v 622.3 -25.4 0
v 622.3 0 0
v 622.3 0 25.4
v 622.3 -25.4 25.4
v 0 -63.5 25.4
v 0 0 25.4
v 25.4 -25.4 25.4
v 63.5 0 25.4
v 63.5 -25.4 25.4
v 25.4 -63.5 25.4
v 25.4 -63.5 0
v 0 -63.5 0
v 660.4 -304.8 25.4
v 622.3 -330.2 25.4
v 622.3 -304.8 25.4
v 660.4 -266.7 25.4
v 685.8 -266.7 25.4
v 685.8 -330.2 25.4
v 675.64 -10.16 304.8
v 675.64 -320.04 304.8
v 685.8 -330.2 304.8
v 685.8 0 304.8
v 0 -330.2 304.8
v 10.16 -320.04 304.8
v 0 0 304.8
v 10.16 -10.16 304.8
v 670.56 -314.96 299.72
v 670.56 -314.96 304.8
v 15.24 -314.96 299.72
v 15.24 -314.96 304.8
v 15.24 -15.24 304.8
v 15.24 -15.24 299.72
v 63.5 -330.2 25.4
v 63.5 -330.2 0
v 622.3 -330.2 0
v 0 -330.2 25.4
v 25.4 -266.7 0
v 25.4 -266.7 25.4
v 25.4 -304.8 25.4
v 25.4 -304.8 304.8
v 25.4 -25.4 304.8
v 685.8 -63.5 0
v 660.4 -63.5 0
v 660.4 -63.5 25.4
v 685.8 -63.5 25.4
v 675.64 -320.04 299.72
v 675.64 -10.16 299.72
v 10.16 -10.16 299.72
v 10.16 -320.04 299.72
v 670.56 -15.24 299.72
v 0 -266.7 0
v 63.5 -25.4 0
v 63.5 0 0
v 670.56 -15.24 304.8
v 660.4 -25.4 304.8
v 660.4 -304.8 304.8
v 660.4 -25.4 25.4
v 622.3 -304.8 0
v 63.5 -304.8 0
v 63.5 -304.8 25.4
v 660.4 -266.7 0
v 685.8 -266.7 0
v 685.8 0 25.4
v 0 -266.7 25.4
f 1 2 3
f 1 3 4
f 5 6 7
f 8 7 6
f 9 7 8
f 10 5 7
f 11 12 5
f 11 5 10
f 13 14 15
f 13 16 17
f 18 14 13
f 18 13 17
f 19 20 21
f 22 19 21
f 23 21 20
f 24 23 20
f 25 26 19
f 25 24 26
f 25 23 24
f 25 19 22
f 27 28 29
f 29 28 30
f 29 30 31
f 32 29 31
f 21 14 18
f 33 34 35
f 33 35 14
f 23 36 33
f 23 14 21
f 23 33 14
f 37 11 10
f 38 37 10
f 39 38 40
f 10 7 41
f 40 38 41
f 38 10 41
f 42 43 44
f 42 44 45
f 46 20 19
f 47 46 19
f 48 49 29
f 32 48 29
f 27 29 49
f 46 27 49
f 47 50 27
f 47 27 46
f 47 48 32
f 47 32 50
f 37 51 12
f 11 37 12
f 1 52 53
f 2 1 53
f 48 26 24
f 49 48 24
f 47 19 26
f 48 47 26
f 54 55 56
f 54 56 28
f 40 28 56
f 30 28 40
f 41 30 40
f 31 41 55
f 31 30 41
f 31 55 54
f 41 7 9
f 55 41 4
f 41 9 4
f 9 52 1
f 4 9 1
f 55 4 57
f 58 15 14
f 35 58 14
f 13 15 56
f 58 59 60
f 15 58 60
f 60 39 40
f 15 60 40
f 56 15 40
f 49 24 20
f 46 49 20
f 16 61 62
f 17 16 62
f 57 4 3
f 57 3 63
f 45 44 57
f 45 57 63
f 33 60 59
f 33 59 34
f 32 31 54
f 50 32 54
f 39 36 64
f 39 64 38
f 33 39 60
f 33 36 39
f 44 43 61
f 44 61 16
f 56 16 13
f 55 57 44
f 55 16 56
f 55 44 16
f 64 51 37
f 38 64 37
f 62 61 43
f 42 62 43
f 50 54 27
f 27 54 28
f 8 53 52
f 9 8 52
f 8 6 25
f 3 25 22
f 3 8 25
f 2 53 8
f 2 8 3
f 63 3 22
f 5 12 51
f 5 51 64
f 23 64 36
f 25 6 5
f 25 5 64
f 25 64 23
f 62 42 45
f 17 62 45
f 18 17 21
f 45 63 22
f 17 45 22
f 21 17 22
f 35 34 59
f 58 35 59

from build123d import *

# Parameters (mm, degrees)
F0_W      = 685.8
F0_H      = 25.4
F1_DEPTH  = 304.8
F2_W      = 25.4
F2_H      = 304.8
F3_DEPTH  = 304.8
F4_DEPTH  = 304.8
F5_W      = 25.4
F5_H      = 304.8
F6_DEPTH  = 660.4
F7_W      = 655.32
F7_H      = 5.08
F7_W_2    = 5.08
F7_H_2    = 299.72
F7_W_3    = 2.54
F8_DEPTH  = 5.08
F9_W      = 63.5
F9_H      = 63.5
F10_DEPTH = 25.4


with BuildPart() as f1:
    # F0 (on Top) → F1 (new body)
    with BuildSketch(Plane.XY):
        with Locations((342.9, -12.7)):
            Rectangle(F0_W, F0_H)
    extrude(amount=F1_DEPTH)

    # F2 (on face) → F3 (join)
    with BuildSketch(Plane.XZ.offset(25.4)):
        with Locations((673.1, 152.4)):
            Rectangle(F2_W, F2_H)
    extrude(amount=F3_DEPTH)

    # F2 (on face) → F4 (join)
    with BuildSketch(Plane.XZ.offset(25.4)):
        with Locations((12.7, 152.4)):
            Rectangle(F2_W, F2_H)
    extrude(amount=F4_DEPTH)

    # F5 (on face) → F6 (join)
    with BuildSketch(Plane.YZ.offset(25.4)):
        with Locations((-317.5, 152.4)):
            Rectangle(F5_W, F5_H)
    extrude(amount=F6_DEPTH)

    # F7 (on face) → F8 (cut)
    with BuildSketch(Plane.XY.offset(304.8)):
        with Locations((342.9, -12.7)):
            Rectangle(F7_W, F7_H)
        Polygon((15.24, -10.16), (12.7, -10.16), (10.16, -10.16), (10.16, -15.24), (15.24, -15.24), align=None)
        with Locations((12.7, -165.1)):
            Rectangle(F7_W_2, F7_H_2)
        with Locations((12.7, -317.5)):
            Rectangle(F7_W_2, F7_H)
        with Locations((342.9, -317.5)):
            Rectangle(F7_W, F7_H)
        with Locations((673.1, -317.5)):
            Rectangle(F7_W_2, F7_H)
        Polygon((675.64, -10.16), (673.1, -10.16), (673.1, -15.24), (670.56, -15.24), (670.56, -314.96), (675.64, -314.96), align=None)
        with Locations((671.83, -12.7)):
            Rectangle(F7_W_3, F7_H)
    extrude(amount=-F8_DEPTH, mode=Mode.SUBTRACT)

    # F9 (on face) → F10 (cut)
    with BuildSketch(Plane(origin=(0, 0, 0), x_dir=(1, 0, 0), z_dir=(0, 0, -1))):
        with Locations((654.05, 31.75)):
            Rectangle(F9_W, F9_H)
        with Locations((654.05, 298.45)):
            Rectangle(F9_W, F9_H)
        with Locations((31.75, 298.45)):
            Rectangle(F9_W, F9_H)
        with Locations((31.75, 31.75)):
            Rectangle(F9_W, F9_H)
    extrude(amount=-F10_DEPTH, mode=Mode.SUBTRACT)


solid = f1.part
